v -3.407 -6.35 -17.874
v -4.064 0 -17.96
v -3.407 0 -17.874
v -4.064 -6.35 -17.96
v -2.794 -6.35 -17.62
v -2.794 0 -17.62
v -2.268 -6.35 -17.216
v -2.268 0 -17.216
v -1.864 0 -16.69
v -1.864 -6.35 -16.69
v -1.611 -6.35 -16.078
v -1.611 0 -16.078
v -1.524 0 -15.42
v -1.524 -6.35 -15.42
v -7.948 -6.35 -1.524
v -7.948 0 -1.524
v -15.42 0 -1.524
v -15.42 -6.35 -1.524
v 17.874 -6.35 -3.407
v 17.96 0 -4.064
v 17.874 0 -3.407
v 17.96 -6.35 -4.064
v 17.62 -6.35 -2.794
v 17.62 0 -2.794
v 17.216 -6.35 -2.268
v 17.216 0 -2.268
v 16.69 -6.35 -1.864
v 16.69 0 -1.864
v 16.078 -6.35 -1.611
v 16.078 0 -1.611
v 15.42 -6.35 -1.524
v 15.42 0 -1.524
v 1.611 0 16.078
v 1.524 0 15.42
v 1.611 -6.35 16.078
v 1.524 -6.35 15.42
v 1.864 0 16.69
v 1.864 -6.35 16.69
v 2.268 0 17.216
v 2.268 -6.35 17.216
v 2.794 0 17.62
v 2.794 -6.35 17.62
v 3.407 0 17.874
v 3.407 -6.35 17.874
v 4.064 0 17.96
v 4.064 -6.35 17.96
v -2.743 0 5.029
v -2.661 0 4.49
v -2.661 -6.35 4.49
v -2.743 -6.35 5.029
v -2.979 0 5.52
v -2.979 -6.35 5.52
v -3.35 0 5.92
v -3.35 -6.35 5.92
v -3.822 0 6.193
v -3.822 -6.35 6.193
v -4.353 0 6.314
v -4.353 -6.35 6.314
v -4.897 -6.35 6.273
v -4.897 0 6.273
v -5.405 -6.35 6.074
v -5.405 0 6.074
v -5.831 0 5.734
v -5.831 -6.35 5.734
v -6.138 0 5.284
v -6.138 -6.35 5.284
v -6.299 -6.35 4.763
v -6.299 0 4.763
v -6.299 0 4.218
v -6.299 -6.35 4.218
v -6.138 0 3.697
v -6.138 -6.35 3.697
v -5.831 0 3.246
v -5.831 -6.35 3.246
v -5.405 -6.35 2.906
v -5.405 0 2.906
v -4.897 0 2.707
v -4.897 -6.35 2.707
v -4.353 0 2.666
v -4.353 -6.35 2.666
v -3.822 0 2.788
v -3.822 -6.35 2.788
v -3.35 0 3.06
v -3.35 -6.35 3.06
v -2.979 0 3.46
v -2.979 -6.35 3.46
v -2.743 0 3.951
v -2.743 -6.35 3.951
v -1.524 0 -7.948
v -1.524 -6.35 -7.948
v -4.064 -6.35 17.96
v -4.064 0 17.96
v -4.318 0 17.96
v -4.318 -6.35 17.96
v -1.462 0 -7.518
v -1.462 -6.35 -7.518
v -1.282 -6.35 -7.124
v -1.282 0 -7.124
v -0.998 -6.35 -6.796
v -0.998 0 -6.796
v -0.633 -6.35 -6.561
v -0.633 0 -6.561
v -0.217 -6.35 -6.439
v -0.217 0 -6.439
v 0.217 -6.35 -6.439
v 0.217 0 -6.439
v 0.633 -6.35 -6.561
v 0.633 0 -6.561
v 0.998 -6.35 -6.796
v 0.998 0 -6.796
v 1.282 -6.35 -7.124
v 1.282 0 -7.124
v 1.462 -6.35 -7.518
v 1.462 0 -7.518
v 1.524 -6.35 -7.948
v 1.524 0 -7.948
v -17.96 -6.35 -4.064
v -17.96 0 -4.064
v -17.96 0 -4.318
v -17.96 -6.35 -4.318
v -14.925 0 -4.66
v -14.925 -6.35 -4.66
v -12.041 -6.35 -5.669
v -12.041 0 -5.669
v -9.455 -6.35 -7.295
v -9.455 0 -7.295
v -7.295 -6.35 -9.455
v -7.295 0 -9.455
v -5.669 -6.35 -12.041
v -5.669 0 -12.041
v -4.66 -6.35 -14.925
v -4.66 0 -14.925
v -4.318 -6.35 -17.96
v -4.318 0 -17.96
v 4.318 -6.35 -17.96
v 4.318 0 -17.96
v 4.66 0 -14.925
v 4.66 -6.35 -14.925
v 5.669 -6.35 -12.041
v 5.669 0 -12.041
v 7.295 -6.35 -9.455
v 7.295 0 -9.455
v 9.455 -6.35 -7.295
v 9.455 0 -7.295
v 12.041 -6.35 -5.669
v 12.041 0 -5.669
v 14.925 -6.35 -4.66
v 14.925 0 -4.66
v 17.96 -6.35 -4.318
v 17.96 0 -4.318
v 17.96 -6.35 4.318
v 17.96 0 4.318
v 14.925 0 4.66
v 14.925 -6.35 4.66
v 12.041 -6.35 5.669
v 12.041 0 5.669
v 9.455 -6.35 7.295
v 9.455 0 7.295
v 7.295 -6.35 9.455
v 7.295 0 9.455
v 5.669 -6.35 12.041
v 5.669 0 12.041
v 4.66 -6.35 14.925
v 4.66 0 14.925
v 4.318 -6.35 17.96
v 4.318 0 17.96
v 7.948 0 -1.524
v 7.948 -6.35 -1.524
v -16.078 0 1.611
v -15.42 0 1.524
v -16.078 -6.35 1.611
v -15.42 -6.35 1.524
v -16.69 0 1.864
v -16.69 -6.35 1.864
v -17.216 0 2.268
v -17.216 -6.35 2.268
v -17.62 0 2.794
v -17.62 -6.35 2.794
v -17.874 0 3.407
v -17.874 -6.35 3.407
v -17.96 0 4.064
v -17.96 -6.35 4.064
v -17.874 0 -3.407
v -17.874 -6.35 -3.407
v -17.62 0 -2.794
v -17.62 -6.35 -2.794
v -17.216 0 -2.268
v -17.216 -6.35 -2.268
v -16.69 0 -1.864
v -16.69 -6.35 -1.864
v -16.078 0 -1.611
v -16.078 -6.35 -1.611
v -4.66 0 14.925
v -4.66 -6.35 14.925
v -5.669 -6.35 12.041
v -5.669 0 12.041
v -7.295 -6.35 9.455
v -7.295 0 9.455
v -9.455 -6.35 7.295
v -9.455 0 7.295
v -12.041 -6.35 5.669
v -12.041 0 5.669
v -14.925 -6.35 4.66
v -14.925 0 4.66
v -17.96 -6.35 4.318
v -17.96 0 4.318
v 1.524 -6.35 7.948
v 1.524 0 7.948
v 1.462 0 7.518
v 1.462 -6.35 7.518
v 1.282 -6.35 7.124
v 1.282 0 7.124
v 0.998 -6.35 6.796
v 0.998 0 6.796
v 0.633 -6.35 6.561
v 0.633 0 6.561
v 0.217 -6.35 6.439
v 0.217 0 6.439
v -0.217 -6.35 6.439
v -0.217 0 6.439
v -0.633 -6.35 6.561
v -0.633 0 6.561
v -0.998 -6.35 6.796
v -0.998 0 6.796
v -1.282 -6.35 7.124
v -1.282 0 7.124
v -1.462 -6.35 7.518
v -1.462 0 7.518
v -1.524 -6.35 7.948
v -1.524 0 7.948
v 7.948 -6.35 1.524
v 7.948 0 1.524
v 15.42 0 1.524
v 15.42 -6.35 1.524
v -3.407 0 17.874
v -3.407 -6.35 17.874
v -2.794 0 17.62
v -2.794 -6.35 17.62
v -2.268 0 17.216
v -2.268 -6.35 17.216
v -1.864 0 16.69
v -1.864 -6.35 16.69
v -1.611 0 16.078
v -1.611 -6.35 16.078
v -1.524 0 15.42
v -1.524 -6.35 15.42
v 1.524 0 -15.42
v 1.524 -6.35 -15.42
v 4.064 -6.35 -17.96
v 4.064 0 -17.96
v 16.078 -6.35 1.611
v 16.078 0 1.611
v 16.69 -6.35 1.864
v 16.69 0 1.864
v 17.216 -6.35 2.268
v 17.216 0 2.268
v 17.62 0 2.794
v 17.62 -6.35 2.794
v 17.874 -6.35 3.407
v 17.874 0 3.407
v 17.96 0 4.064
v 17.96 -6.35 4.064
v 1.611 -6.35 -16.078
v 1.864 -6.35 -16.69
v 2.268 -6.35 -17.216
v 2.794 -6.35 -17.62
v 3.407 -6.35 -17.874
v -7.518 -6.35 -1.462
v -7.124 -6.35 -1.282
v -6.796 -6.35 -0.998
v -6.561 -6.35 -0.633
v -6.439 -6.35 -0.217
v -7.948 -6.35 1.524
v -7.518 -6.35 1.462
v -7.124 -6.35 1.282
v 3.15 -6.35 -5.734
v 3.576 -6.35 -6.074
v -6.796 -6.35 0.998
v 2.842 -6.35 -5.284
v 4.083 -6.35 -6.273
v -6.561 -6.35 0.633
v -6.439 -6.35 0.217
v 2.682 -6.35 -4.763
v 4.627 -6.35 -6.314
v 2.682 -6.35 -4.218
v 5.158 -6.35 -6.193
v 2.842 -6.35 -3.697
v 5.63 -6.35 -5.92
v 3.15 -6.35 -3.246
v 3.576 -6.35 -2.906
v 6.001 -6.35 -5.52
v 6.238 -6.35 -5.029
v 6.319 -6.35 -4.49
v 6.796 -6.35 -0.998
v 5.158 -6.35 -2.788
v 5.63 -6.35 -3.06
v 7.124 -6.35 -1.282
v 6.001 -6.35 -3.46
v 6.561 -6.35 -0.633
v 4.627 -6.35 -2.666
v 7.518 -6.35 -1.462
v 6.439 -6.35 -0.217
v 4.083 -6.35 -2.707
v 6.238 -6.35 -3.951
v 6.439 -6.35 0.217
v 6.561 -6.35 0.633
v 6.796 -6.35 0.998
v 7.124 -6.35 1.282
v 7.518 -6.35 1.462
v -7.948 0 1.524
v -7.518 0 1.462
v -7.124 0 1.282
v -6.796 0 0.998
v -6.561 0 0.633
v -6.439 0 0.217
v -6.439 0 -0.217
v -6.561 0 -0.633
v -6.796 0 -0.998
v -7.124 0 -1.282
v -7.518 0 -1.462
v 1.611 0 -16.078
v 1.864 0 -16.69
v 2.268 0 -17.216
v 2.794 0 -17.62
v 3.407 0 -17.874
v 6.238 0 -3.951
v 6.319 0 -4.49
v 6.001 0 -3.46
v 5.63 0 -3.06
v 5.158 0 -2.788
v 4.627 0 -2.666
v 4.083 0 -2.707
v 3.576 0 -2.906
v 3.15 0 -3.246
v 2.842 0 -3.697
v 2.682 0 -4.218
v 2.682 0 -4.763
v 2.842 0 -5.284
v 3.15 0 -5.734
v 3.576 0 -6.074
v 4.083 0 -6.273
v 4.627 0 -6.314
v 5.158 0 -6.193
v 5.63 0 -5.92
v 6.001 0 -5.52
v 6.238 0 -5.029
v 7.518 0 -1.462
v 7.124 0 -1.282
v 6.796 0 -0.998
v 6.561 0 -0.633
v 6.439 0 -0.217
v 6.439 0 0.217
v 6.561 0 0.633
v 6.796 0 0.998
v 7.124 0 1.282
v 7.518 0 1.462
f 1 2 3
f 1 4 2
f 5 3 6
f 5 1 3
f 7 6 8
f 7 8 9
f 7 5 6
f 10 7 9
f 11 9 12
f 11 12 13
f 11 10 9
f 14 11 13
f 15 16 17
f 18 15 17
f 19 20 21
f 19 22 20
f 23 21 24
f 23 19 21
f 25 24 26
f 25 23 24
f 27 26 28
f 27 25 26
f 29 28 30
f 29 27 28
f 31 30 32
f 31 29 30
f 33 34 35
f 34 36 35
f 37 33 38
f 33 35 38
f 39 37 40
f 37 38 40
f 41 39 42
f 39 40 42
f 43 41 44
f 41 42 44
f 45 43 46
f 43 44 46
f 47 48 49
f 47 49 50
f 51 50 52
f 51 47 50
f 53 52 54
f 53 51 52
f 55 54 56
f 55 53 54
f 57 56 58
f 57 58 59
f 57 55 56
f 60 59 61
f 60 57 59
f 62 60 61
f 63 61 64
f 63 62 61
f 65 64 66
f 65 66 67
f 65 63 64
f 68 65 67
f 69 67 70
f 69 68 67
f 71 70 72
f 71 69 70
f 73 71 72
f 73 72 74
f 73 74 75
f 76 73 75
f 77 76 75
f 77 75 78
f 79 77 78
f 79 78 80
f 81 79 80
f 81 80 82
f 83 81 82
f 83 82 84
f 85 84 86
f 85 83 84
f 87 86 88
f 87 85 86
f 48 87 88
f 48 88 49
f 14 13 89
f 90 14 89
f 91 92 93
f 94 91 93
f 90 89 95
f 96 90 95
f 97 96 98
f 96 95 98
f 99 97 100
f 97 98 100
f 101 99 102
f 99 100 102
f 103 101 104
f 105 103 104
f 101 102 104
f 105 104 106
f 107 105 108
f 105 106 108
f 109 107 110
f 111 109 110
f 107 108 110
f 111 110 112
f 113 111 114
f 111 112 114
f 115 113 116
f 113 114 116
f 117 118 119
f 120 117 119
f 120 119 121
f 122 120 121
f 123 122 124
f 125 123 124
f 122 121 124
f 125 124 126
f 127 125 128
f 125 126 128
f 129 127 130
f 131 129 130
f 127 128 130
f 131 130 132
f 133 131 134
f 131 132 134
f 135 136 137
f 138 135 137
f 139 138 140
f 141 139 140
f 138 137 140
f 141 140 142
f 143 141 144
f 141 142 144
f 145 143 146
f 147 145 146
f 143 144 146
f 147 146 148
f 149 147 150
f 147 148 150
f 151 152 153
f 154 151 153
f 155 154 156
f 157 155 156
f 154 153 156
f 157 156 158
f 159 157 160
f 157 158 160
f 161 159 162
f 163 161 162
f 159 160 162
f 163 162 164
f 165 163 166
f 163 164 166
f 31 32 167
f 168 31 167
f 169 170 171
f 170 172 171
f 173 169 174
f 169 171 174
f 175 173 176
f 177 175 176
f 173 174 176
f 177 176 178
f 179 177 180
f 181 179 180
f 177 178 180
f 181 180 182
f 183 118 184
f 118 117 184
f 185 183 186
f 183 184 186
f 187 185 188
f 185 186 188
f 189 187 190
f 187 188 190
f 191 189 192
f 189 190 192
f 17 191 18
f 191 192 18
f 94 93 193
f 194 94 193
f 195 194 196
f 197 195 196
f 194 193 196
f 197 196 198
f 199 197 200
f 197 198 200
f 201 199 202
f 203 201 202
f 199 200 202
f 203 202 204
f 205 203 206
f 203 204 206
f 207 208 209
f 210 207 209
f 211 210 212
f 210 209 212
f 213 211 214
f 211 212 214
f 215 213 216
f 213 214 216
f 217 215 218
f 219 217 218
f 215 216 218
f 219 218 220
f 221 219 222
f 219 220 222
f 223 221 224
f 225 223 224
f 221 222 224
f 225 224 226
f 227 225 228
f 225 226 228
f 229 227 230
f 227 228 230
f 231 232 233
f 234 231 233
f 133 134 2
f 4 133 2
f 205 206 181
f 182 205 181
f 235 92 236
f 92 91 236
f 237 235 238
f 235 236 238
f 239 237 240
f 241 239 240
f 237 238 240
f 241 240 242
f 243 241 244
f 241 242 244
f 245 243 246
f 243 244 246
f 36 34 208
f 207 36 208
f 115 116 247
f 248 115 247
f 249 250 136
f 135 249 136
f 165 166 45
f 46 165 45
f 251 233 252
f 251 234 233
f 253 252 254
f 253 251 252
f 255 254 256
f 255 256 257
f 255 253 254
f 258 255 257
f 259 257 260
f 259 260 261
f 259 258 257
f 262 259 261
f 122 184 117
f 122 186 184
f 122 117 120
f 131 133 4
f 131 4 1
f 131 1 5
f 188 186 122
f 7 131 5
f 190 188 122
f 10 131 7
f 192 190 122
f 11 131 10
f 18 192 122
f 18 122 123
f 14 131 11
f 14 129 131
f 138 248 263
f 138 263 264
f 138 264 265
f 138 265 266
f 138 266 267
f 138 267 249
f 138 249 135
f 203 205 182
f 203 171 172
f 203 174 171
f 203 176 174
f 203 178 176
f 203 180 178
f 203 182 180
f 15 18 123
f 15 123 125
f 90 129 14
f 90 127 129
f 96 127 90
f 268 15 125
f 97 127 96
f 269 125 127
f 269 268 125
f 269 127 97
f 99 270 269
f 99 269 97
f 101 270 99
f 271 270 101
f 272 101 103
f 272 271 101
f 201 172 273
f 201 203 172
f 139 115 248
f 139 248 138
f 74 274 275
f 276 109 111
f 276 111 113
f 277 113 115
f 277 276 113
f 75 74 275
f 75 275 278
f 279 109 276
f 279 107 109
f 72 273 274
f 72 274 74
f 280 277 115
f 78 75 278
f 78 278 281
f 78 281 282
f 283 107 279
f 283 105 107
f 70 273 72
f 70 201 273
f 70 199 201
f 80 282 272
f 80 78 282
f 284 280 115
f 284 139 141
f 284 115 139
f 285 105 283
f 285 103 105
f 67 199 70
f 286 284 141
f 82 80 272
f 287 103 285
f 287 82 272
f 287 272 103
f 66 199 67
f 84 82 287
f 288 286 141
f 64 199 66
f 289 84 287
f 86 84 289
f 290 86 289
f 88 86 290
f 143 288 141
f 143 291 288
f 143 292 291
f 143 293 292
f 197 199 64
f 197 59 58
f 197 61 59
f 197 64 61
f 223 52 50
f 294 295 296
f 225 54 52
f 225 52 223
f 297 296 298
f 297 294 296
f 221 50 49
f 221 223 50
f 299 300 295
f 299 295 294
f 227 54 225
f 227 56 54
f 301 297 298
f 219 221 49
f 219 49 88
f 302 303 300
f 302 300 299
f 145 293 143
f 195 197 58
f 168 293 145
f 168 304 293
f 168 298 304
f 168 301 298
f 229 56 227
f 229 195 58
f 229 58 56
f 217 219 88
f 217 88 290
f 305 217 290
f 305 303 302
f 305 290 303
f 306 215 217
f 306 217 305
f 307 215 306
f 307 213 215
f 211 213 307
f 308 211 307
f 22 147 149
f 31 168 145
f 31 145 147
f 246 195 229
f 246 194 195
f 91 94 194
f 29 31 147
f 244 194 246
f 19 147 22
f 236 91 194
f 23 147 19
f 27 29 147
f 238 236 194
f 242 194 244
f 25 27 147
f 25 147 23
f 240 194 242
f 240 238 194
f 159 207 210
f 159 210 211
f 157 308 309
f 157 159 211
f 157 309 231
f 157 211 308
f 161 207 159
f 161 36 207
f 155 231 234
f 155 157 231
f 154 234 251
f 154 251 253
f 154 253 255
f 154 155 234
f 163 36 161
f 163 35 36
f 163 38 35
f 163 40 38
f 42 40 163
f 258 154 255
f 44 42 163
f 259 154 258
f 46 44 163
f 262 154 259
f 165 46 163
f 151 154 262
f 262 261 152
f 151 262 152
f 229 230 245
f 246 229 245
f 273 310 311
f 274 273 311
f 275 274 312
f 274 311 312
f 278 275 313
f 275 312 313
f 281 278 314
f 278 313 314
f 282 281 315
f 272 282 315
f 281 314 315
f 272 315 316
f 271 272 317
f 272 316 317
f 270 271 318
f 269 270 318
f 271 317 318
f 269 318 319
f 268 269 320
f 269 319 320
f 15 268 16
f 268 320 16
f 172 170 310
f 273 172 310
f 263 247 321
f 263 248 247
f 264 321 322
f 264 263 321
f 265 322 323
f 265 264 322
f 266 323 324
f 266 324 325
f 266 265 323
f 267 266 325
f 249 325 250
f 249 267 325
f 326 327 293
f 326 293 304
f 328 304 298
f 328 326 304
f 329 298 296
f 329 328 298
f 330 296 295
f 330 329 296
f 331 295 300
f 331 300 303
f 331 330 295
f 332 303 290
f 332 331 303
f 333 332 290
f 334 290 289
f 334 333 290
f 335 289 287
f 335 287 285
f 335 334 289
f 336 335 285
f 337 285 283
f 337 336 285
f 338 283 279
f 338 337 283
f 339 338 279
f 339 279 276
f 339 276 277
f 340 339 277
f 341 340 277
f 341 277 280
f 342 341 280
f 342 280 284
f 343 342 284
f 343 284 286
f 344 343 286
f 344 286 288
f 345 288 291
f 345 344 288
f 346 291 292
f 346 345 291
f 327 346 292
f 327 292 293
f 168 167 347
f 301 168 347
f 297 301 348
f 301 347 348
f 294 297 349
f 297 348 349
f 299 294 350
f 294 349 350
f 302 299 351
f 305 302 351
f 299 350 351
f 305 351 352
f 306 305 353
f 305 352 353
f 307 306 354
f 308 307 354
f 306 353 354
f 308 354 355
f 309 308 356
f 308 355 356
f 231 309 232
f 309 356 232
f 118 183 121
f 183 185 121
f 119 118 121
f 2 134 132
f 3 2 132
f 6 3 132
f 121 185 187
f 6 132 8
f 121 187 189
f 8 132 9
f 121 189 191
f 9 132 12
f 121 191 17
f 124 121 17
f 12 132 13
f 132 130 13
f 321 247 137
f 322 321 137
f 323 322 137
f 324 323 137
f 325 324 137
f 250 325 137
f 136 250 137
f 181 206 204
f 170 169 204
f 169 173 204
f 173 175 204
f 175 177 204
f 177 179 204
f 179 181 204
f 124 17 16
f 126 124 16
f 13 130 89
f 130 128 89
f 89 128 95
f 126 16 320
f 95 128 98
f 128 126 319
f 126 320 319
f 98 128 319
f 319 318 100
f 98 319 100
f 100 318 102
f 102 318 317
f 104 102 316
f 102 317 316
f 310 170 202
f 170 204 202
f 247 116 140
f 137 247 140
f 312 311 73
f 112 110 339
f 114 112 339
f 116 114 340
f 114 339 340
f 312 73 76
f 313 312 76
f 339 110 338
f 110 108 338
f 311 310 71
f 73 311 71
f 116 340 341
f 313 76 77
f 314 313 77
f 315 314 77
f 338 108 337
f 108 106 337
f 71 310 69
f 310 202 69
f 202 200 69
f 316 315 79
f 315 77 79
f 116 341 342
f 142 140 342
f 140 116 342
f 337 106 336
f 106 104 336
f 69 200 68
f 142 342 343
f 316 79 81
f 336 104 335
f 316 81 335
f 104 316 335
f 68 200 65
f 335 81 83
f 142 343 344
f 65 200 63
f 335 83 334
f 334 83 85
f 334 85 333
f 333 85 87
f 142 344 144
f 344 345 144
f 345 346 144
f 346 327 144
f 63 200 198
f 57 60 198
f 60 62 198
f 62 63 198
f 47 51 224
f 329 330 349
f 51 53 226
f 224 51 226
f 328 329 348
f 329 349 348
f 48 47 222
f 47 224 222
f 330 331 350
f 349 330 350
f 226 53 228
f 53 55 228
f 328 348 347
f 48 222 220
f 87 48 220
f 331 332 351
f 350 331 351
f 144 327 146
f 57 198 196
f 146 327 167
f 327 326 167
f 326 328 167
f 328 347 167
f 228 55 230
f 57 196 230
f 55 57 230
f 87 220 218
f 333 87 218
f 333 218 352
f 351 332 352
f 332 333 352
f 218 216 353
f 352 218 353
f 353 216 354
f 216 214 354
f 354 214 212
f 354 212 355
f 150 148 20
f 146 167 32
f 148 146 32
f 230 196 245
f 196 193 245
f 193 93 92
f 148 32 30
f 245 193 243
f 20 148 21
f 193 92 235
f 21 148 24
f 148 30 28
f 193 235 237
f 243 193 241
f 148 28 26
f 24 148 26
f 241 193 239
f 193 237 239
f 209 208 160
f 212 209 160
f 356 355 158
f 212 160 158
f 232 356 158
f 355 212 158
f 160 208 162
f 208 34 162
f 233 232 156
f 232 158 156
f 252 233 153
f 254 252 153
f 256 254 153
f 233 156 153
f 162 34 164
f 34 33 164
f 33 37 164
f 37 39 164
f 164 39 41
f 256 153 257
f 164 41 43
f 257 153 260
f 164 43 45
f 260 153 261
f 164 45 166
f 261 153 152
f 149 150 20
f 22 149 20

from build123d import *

# Parameters (mm, degrees)
F0_R     = 1.8288
F1_DEPTH = 6.35
F2_R     = 2.54


with BuildPart() as f1:
    # F0 (on Front) → F1 (new body)
    with BuildSketch(Plane.XZ):
        with BuildLine():
            Line((-4.318172, -17.96034), (-1.524, -17.96034))
            Line((-1.524, -17.96034), (-1.524, -7.94766))
            ThreePointArc((-1.524, -7.94766), (0, -6.42366), (1.524, -7.94766))
            Line((1.524, -7.94766), (1.524, -17.96034))
            Line((1.524, -17.96034), (4.318172, -17.96034))
            ThreePointArc((4.318172, -17.96034), (8.313921, -8.313921), (17.96034, -4.318172))
            Line((17.96034, -4.318172), (17.96034, -1.524))
            Line((17.96034, -1.524), (7.94766, -1.524))
            ThreePointArc((7.94766, -1.524), (6.42366, 0), (7.94766, 1.524))
            Line((7.94766, 1.524), (17.96034, 1.524))
            Line((17.96034, 1.524), (17.96034, 4.318172))
            ThreePointArc((17.96034, 4.318172), (8.313921, 8.313921), (4.318172, 17.96034))
            Line((4.318172, 17.96034), (1.524, 17.96034))
            Line((1.524, 17.96034), (1.524, 7.94766))
            ThreePointArc((1.524, 7.94766), (0, 6.42366), (-1.524, 7.94766))
            Line((-1.524, 7.94766), (-1.524, 17.96034))
            Line((-1.524, 17.96034), (-4.318172, 17.96034))
            ThreePointArc((-4.318172, 17.96034), (-8.313921, 8.313921), (-17.96034, 4.318172))
            Line((-17.96034, 4.318172), (-17.96034, 1.524))
            Line((-17.96034, 1.524), (-7.94766, 1.524))
            ThreePointArc((-7.94766, 1.524), (-6.42366, 0), (-7.94766, -1.524))
            Line((-7.94766, -1.524), (-17.96034, -1.524))
            Line((-17.96034, -1.524), (-17.96034, -4.318172))
            ThreePointArc((-17.96034, -4.318172), (-8.313921, -8.313921), (-4.318172, -17.96034))
        make_face()
        with Locations((4.490128, -4.490128)):
            Circle(F0_R, mode=Mode.SUBTRACT)
        with Locations((-4.490128, 4.490128)):
            Circle(F0_R, mode=Mode.SUBTRACT)
    extrude(amount=F1_DEPTH)

    # F2
    f2_edges = [f1.edges().sort_by_distance(p)[0] for p in [
        (-1.524, -3.175, -17.96034),
        (1.524, -3.175, -17.96034),
        (-17.96034, -3.175, 1.524),
        (17.96034, -3.175, 1.524),
        (-17.96034, -3.175, -1.524),
        (17.96034, -3.175, -1.524),
        (1.524, -3.175, 17.96034),
        (-1.524, -3.175, 17.96034),
    ]]
    fillet(f2_edges, radius=F2_R)


solid = f1.part
